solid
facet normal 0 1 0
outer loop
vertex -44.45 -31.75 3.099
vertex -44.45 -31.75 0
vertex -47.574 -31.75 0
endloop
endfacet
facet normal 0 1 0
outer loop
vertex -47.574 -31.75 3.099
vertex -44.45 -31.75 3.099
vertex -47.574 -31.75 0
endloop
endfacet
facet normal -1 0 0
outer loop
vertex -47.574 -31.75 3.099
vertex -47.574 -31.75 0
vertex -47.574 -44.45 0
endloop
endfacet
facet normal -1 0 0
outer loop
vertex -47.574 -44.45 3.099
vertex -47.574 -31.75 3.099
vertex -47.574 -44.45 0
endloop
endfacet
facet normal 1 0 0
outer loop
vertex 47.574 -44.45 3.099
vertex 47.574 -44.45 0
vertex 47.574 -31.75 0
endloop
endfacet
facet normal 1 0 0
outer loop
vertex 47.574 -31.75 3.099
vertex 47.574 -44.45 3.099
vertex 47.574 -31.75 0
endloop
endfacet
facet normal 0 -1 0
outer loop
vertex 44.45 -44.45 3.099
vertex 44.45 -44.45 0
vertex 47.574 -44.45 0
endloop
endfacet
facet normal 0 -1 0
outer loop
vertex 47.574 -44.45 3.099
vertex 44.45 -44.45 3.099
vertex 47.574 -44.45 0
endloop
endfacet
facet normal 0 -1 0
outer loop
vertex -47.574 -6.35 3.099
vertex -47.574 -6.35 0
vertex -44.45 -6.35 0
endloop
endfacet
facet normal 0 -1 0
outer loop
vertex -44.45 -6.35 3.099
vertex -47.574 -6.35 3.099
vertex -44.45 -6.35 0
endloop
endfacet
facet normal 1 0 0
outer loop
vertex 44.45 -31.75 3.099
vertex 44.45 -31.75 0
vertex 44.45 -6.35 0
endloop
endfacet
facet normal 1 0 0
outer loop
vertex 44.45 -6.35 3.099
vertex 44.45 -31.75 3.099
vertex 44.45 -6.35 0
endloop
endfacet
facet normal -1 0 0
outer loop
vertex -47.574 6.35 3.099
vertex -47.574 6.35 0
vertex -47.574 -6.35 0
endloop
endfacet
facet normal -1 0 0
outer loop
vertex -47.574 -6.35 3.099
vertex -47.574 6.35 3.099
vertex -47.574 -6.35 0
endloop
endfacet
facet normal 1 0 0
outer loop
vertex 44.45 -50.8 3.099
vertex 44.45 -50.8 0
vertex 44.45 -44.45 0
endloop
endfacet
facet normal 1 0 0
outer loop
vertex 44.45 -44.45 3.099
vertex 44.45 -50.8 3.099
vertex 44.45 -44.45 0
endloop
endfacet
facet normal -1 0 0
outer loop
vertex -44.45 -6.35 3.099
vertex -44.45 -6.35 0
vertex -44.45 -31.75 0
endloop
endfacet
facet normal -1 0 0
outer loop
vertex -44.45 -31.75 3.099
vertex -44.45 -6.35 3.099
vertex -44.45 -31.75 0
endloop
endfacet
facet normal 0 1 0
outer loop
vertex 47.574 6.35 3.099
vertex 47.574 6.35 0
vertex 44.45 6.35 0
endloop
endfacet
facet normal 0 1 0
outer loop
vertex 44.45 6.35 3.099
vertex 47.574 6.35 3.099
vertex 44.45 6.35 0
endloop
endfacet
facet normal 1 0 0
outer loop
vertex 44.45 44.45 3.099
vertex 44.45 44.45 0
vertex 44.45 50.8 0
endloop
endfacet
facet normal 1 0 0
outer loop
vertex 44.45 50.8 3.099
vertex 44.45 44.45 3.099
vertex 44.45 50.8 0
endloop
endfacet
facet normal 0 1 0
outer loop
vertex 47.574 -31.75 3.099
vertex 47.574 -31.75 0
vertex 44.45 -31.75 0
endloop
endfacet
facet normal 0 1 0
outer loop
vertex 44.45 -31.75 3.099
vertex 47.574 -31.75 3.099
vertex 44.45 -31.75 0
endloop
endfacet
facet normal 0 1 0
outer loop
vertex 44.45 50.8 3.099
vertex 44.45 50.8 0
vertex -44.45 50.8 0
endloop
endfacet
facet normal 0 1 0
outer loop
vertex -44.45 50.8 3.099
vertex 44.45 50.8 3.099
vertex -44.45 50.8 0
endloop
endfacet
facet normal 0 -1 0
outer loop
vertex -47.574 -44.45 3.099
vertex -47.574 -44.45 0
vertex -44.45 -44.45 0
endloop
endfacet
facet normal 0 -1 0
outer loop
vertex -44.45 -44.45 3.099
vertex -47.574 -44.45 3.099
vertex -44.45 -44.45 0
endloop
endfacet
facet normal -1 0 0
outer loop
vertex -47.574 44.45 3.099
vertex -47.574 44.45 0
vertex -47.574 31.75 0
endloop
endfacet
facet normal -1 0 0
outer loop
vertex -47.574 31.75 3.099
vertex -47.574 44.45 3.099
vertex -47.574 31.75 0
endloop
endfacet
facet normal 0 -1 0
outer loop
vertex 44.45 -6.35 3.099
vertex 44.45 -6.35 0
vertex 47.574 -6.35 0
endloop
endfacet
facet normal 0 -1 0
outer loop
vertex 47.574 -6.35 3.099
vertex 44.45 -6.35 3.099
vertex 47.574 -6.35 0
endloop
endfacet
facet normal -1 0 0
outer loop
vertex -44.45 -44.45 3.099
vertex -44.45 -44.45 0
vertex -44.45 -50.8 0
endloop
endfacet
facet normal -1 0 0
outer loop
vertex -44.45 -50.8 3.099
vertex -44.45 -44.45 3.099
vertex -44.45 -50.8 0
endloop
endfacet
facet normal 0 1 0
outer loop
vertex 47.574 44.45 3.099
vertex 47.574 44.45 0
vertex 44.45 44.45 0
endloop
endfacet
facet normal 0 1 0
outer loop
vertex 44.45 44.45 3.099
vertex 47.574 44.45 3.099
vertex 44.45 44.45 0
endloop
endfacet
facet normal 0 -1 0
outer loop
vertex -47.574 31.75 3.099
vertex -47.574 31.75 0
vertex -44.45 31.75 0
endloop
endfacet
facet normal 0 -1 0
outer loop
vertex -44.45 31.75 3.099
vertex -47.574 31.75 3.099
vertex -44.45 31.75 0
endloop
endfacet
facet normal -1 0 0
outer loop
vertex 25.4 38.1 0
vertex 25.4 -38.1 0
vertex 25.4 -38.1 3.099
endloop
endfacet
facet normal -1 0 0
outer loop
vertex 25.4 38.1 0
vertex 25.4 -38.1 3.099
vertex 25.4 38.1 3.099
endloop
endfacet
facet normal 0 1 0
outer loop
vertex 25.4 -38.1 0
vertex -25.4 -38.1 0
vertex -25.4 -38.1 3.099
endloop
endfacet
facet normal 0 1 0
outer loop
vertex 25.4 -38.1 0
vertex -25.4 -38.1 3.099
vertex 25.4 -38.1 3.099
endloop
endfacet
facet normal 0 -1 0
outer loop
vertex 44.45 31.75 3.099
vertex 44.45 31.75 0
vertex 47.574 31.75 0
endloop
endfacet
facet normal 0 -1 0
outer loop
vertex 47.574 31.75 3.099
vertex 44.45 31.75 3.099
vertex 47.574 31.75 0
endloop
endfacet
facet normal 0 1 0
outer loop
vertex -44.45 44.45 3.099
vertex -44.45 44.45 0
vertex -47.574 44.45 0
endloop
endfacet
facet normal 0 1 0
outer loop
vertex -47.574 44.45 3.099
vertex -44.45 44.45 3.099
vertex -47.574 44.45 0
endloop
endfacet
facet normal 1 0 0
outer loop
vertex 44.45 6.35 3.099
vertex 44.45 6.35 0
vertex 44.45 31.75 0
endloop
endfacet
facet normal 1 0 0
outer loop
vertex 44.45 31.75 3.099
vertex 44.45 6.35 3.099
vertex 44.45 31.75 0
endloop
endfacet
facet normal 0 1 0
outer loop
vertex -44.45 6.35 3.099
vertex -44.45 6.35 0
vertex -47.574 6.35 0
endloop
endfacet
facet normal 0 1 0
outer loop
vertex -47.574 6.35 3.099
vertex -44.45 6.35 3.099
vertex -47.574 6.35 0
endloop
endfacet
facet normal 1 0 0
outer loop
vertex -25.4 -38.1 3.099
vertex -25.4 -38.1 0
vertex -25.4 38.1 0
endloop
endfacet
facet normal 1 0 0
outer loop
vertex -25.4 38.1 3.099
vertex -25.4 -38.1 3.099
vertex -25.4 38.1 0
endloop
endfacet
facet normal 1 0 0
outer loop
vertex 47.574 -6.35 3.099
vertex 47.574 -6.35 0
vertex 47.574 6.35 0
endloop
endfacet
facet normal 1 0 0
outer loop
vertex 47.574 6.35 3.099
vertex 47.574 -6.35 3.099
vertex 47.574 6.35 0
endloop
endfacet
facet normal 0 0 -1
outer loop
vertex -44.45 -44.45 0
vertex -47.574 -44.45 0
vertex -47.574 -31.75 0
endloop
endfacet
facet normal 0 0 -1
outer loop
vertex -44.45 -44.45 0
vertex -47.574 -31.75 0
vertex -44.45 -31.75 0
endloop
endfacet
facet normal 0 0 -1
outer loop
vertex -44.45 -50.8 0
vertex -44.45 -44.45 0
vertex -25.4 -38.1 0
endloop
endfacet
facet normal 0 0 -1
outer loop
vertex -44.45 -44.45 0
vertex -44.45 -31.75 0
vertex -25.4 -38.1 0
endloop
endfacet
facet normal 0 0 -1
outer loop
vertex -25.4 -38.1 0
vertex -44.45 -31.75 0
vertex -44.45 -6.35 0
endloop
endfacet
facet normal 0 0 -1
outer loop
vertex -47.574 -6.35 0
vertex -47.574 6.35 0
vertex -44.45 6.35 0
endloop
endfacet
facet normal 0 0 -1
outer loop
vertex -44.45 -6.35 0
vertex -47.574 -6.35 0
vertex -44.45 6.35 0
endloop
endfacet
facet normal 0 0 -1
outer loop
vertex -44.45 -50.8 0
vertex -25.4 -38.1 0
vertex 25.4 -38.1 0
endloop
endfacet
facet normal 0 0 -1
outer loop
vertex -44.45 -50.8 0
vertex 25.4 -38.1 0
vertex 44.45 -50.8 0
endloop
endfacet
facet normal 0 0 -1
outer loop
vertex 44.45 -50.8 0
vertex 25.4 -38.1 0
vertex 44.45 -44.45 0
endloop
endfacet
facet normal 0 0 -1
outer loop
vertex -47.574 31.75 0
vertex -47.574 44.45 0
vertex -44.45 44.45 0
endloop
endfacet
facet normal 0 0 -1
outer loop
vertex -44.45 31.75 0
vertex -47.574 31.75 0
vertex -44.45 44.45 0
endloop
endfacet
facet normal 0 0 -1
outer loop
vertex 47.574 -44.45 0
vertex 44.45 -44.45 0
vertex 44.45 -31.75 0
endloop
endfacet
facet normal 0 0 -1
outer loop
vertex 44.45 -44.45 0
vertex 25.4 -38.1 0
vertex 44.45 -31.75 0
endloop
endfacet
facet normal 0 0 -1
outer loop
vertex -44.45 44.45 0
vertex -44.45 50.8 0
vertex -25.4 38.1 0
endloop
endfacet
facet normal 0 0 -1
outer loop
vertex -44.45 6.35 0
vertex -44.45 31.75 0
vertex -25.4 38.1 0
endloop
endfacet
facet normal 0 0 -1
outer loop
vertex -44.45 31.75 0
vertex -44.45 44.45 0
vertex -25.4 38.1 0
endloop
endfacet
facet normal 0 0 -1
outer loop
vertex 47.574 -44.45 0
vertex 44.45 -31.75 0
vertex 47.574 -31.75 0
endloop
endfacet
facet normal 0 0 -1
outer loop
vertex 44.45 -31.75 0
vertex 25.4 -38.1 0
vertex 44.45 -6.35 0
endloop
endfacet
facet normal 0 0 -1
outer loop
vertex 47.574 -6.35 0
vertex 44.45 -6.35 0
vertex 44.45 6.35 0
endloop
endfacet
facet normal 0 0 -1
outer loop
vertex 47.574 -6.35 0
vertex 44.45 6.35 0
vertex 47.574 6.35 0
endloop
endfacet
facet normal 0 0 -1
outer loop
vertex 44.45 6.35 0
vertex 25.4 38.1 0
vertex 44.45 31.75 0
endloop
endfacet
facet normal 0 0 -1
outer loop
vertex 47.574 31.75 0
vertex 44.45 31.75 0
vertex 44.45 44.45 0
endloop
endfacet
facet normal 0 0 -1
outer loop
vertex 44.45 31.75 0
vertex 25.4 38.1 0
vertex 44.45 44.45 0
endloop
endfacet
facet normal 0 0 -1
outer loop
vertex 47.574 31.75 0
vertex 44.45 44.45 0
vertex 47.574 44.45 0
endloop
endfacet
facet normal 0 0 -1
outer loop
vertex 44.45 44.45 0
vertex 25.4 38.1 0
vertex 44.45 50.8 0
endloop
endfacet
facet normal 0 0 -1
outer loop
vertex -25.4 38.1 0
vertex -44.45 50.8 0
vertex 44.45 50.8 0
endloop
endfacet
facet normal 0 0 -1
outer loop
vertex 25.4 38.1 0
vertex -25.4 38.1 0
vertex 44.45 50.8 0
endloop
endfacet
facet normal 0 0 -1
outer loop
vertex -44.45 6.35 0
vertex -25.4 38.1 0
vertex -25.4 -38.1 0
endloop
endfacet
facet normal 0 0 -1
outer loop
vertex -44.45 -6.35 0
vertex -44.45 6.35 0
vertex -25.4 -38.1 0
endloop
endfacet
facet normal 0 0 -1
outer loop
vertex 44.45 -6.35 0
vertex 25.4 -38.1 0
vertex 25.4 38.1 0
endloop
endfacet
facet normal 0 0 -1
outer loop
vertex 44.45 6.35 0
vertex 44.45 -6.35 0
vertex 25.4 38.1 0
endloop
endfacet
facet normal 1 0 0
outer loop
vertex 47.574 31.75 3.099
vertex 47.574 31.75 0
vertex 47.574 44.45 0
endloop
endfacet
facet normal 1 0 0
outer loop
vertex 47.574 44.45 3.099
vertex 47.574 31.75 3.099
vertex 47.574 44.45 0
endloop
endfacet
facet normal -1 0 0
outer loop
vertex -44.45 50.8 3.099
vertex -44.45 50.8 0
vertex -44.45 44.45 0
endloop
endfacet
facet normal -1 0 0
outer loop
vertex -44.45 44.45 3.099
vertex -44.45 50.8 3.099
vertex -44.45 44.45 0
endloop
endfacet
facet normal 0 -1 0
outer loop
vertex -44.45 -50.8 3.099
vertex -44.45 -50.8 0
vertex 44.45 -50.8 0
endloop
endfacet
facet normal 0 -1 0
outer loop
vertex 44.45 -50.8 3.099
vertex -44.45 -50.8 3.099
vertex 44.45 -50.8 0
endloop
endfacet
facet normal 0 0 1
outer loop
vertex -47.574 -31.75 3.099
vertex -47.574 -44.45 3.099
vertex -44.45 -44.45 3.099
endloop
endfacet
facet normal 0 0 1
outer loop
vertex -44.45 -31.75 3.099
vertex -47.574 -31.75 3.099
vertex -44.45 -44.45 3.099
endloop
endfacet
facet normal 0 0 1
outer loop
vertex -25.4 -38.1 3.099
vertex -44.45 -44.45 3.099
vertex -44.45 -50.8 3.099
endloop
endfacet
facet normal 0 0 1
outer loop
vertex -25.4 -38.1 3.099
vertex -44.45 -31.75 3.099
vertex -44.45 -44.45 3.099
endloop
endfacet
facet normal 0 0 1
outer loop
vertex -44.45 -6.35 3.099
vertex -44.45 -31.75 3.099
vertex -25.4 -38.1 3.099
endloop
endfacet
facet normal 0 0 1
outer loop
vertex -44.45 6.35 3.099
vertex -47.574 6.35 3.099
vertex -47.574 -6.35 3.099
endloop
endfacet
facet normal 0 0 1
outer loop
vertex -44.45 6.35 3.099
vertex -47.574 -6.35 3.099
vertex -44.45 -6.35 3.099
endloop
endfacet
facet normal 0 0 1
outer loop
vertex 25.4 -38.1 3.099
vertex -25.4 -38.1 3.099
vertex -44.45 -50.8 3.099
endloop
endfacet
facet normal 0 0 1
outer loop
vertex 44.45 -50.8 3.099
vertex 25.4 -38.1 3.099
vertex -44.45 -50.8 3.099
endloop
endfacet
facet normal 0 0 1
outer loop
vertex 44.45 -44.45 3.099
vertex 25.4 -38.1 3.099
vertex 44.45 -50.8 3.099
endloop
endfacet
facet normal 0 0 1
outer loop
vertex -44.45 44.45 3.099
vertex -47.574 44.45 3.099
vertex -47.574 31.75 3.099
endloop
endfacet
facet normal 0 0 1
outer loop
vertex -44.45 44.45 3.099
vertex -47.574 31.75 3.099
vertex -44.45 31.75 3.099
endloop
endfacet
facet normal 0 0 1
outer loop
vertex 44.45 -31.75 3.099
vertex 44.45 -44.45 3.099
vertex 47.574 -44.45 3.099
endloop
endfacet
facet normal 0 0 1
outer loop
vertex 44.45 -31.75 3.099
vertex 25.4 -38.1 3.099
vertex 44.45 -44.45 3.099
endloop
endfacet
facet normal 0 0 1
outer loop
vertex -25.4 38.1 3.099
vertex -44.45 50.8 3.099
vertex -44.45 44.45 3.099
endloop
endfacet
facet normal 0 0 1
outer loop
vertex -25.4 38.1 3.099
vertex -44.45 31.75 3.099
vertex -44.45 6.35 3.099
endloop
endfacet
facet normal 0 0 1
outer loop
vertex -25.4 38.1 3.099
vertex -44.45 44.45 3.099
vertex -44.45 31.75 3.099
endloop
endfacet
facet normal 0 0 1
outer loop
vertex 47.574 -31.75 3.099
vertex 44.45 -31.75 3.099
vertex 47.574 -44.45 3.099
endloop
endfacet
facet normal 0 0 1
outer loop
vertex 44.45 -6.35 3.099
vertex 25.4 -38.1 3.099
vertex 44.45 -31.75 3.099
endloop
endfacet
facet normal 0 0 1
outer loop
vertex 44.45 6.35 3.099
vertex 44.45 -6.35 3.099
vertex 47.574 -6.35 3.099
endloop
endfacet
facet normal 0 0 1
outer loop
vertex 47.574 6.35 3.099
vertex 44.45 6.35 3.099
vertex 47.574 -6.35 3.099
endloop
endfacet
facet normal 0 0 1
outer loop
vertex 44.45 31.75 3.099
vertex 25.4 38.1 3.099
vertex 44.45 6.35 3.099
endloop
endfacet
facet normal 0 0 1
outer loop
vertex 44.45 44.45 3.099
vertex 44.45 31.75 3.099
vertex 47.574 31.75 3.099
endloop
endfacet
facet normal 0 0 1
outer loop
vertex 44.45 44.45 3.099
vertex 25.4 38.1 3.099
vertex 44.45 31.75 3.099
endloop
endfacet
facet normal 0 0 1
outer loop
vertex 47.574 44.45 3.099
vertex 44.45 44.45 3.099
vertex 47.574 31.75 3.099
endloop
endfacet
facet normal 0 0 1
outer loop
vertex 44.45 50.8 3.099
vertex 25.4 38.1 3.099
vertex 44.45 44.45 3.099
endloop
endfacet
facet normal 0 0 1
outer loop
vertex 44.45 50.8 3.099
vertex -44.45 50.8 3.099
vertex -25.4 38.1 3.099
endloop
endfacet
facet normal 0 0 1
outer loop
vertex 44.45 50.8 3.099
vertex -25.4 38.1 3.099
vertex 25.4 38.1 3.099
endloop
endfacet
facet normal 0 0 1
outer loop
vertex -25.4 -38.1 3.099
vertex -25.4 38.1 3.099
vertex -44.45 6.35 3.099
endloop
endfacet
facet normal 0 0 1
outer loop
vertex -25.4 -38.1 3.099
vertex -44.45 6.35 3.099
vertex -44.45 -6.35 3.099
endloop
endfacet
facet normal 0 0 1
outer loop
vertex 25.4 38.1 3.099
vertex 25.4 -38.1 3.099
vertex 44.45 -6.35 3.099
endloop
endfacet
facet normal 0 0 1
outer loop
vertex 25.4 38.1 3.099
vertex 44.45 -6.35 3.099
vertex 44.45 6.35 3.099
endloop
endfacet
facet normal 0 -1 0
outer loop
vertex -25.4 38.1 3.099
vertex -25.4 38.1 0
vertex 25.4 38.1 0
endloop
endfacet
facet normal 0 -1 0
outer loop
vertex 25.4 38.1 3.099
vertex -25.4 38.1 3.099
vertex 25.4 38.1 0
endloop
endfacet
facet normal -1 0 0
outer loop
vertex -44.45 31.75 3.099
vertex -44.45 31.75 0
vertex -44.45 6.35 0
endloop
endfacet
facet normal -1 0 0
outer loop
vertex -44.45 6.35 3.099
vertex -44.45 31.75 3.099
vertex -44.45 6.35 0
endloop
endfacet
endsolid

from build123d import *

# Parameters (mm, degrees)
F0_W     = 50.8
F0_H     = 76.2
F1_DEPTH = 3.0988


with BuildPart() as f1:
    # F0 (on Top) → F1 (new body)
    with BuildSketch(Plane.XY):
        Polygon((44.45, 50.8), (-44.45, 50.8), (-44.45, 44.45), (-47.5742, 44.45), (-47.5742, 31.75), (-44.45, 31.75), (-44.45, 6.35), (-47.5742, 6.35), (-47.5742, -6.35), (-44.45, -6.35), (-44.45, -31.75), (-47.5742, -31.75), (-47.5742, -44.45), (-44.45, -44.45), (-44.45, -50.8), (44.45, -50.8), (44.45, -44.45), (47.5742, -44.45), (47.5742, -31.75), (44.45, -31.75), (44.45, -6.35), (47.5742, -6.35), (47.5742, 6.35), (44.45, 6.35), (44.45, 31.75), (47.5742, 31.75), (47.5742, 44.45), (44.45, 44.45), align=None)
        Rectangle(F0_W, F0_H, mode=Mode.SUBTRACT)
    extrude(amount=F1_DEPTH)


solid = f1.part
